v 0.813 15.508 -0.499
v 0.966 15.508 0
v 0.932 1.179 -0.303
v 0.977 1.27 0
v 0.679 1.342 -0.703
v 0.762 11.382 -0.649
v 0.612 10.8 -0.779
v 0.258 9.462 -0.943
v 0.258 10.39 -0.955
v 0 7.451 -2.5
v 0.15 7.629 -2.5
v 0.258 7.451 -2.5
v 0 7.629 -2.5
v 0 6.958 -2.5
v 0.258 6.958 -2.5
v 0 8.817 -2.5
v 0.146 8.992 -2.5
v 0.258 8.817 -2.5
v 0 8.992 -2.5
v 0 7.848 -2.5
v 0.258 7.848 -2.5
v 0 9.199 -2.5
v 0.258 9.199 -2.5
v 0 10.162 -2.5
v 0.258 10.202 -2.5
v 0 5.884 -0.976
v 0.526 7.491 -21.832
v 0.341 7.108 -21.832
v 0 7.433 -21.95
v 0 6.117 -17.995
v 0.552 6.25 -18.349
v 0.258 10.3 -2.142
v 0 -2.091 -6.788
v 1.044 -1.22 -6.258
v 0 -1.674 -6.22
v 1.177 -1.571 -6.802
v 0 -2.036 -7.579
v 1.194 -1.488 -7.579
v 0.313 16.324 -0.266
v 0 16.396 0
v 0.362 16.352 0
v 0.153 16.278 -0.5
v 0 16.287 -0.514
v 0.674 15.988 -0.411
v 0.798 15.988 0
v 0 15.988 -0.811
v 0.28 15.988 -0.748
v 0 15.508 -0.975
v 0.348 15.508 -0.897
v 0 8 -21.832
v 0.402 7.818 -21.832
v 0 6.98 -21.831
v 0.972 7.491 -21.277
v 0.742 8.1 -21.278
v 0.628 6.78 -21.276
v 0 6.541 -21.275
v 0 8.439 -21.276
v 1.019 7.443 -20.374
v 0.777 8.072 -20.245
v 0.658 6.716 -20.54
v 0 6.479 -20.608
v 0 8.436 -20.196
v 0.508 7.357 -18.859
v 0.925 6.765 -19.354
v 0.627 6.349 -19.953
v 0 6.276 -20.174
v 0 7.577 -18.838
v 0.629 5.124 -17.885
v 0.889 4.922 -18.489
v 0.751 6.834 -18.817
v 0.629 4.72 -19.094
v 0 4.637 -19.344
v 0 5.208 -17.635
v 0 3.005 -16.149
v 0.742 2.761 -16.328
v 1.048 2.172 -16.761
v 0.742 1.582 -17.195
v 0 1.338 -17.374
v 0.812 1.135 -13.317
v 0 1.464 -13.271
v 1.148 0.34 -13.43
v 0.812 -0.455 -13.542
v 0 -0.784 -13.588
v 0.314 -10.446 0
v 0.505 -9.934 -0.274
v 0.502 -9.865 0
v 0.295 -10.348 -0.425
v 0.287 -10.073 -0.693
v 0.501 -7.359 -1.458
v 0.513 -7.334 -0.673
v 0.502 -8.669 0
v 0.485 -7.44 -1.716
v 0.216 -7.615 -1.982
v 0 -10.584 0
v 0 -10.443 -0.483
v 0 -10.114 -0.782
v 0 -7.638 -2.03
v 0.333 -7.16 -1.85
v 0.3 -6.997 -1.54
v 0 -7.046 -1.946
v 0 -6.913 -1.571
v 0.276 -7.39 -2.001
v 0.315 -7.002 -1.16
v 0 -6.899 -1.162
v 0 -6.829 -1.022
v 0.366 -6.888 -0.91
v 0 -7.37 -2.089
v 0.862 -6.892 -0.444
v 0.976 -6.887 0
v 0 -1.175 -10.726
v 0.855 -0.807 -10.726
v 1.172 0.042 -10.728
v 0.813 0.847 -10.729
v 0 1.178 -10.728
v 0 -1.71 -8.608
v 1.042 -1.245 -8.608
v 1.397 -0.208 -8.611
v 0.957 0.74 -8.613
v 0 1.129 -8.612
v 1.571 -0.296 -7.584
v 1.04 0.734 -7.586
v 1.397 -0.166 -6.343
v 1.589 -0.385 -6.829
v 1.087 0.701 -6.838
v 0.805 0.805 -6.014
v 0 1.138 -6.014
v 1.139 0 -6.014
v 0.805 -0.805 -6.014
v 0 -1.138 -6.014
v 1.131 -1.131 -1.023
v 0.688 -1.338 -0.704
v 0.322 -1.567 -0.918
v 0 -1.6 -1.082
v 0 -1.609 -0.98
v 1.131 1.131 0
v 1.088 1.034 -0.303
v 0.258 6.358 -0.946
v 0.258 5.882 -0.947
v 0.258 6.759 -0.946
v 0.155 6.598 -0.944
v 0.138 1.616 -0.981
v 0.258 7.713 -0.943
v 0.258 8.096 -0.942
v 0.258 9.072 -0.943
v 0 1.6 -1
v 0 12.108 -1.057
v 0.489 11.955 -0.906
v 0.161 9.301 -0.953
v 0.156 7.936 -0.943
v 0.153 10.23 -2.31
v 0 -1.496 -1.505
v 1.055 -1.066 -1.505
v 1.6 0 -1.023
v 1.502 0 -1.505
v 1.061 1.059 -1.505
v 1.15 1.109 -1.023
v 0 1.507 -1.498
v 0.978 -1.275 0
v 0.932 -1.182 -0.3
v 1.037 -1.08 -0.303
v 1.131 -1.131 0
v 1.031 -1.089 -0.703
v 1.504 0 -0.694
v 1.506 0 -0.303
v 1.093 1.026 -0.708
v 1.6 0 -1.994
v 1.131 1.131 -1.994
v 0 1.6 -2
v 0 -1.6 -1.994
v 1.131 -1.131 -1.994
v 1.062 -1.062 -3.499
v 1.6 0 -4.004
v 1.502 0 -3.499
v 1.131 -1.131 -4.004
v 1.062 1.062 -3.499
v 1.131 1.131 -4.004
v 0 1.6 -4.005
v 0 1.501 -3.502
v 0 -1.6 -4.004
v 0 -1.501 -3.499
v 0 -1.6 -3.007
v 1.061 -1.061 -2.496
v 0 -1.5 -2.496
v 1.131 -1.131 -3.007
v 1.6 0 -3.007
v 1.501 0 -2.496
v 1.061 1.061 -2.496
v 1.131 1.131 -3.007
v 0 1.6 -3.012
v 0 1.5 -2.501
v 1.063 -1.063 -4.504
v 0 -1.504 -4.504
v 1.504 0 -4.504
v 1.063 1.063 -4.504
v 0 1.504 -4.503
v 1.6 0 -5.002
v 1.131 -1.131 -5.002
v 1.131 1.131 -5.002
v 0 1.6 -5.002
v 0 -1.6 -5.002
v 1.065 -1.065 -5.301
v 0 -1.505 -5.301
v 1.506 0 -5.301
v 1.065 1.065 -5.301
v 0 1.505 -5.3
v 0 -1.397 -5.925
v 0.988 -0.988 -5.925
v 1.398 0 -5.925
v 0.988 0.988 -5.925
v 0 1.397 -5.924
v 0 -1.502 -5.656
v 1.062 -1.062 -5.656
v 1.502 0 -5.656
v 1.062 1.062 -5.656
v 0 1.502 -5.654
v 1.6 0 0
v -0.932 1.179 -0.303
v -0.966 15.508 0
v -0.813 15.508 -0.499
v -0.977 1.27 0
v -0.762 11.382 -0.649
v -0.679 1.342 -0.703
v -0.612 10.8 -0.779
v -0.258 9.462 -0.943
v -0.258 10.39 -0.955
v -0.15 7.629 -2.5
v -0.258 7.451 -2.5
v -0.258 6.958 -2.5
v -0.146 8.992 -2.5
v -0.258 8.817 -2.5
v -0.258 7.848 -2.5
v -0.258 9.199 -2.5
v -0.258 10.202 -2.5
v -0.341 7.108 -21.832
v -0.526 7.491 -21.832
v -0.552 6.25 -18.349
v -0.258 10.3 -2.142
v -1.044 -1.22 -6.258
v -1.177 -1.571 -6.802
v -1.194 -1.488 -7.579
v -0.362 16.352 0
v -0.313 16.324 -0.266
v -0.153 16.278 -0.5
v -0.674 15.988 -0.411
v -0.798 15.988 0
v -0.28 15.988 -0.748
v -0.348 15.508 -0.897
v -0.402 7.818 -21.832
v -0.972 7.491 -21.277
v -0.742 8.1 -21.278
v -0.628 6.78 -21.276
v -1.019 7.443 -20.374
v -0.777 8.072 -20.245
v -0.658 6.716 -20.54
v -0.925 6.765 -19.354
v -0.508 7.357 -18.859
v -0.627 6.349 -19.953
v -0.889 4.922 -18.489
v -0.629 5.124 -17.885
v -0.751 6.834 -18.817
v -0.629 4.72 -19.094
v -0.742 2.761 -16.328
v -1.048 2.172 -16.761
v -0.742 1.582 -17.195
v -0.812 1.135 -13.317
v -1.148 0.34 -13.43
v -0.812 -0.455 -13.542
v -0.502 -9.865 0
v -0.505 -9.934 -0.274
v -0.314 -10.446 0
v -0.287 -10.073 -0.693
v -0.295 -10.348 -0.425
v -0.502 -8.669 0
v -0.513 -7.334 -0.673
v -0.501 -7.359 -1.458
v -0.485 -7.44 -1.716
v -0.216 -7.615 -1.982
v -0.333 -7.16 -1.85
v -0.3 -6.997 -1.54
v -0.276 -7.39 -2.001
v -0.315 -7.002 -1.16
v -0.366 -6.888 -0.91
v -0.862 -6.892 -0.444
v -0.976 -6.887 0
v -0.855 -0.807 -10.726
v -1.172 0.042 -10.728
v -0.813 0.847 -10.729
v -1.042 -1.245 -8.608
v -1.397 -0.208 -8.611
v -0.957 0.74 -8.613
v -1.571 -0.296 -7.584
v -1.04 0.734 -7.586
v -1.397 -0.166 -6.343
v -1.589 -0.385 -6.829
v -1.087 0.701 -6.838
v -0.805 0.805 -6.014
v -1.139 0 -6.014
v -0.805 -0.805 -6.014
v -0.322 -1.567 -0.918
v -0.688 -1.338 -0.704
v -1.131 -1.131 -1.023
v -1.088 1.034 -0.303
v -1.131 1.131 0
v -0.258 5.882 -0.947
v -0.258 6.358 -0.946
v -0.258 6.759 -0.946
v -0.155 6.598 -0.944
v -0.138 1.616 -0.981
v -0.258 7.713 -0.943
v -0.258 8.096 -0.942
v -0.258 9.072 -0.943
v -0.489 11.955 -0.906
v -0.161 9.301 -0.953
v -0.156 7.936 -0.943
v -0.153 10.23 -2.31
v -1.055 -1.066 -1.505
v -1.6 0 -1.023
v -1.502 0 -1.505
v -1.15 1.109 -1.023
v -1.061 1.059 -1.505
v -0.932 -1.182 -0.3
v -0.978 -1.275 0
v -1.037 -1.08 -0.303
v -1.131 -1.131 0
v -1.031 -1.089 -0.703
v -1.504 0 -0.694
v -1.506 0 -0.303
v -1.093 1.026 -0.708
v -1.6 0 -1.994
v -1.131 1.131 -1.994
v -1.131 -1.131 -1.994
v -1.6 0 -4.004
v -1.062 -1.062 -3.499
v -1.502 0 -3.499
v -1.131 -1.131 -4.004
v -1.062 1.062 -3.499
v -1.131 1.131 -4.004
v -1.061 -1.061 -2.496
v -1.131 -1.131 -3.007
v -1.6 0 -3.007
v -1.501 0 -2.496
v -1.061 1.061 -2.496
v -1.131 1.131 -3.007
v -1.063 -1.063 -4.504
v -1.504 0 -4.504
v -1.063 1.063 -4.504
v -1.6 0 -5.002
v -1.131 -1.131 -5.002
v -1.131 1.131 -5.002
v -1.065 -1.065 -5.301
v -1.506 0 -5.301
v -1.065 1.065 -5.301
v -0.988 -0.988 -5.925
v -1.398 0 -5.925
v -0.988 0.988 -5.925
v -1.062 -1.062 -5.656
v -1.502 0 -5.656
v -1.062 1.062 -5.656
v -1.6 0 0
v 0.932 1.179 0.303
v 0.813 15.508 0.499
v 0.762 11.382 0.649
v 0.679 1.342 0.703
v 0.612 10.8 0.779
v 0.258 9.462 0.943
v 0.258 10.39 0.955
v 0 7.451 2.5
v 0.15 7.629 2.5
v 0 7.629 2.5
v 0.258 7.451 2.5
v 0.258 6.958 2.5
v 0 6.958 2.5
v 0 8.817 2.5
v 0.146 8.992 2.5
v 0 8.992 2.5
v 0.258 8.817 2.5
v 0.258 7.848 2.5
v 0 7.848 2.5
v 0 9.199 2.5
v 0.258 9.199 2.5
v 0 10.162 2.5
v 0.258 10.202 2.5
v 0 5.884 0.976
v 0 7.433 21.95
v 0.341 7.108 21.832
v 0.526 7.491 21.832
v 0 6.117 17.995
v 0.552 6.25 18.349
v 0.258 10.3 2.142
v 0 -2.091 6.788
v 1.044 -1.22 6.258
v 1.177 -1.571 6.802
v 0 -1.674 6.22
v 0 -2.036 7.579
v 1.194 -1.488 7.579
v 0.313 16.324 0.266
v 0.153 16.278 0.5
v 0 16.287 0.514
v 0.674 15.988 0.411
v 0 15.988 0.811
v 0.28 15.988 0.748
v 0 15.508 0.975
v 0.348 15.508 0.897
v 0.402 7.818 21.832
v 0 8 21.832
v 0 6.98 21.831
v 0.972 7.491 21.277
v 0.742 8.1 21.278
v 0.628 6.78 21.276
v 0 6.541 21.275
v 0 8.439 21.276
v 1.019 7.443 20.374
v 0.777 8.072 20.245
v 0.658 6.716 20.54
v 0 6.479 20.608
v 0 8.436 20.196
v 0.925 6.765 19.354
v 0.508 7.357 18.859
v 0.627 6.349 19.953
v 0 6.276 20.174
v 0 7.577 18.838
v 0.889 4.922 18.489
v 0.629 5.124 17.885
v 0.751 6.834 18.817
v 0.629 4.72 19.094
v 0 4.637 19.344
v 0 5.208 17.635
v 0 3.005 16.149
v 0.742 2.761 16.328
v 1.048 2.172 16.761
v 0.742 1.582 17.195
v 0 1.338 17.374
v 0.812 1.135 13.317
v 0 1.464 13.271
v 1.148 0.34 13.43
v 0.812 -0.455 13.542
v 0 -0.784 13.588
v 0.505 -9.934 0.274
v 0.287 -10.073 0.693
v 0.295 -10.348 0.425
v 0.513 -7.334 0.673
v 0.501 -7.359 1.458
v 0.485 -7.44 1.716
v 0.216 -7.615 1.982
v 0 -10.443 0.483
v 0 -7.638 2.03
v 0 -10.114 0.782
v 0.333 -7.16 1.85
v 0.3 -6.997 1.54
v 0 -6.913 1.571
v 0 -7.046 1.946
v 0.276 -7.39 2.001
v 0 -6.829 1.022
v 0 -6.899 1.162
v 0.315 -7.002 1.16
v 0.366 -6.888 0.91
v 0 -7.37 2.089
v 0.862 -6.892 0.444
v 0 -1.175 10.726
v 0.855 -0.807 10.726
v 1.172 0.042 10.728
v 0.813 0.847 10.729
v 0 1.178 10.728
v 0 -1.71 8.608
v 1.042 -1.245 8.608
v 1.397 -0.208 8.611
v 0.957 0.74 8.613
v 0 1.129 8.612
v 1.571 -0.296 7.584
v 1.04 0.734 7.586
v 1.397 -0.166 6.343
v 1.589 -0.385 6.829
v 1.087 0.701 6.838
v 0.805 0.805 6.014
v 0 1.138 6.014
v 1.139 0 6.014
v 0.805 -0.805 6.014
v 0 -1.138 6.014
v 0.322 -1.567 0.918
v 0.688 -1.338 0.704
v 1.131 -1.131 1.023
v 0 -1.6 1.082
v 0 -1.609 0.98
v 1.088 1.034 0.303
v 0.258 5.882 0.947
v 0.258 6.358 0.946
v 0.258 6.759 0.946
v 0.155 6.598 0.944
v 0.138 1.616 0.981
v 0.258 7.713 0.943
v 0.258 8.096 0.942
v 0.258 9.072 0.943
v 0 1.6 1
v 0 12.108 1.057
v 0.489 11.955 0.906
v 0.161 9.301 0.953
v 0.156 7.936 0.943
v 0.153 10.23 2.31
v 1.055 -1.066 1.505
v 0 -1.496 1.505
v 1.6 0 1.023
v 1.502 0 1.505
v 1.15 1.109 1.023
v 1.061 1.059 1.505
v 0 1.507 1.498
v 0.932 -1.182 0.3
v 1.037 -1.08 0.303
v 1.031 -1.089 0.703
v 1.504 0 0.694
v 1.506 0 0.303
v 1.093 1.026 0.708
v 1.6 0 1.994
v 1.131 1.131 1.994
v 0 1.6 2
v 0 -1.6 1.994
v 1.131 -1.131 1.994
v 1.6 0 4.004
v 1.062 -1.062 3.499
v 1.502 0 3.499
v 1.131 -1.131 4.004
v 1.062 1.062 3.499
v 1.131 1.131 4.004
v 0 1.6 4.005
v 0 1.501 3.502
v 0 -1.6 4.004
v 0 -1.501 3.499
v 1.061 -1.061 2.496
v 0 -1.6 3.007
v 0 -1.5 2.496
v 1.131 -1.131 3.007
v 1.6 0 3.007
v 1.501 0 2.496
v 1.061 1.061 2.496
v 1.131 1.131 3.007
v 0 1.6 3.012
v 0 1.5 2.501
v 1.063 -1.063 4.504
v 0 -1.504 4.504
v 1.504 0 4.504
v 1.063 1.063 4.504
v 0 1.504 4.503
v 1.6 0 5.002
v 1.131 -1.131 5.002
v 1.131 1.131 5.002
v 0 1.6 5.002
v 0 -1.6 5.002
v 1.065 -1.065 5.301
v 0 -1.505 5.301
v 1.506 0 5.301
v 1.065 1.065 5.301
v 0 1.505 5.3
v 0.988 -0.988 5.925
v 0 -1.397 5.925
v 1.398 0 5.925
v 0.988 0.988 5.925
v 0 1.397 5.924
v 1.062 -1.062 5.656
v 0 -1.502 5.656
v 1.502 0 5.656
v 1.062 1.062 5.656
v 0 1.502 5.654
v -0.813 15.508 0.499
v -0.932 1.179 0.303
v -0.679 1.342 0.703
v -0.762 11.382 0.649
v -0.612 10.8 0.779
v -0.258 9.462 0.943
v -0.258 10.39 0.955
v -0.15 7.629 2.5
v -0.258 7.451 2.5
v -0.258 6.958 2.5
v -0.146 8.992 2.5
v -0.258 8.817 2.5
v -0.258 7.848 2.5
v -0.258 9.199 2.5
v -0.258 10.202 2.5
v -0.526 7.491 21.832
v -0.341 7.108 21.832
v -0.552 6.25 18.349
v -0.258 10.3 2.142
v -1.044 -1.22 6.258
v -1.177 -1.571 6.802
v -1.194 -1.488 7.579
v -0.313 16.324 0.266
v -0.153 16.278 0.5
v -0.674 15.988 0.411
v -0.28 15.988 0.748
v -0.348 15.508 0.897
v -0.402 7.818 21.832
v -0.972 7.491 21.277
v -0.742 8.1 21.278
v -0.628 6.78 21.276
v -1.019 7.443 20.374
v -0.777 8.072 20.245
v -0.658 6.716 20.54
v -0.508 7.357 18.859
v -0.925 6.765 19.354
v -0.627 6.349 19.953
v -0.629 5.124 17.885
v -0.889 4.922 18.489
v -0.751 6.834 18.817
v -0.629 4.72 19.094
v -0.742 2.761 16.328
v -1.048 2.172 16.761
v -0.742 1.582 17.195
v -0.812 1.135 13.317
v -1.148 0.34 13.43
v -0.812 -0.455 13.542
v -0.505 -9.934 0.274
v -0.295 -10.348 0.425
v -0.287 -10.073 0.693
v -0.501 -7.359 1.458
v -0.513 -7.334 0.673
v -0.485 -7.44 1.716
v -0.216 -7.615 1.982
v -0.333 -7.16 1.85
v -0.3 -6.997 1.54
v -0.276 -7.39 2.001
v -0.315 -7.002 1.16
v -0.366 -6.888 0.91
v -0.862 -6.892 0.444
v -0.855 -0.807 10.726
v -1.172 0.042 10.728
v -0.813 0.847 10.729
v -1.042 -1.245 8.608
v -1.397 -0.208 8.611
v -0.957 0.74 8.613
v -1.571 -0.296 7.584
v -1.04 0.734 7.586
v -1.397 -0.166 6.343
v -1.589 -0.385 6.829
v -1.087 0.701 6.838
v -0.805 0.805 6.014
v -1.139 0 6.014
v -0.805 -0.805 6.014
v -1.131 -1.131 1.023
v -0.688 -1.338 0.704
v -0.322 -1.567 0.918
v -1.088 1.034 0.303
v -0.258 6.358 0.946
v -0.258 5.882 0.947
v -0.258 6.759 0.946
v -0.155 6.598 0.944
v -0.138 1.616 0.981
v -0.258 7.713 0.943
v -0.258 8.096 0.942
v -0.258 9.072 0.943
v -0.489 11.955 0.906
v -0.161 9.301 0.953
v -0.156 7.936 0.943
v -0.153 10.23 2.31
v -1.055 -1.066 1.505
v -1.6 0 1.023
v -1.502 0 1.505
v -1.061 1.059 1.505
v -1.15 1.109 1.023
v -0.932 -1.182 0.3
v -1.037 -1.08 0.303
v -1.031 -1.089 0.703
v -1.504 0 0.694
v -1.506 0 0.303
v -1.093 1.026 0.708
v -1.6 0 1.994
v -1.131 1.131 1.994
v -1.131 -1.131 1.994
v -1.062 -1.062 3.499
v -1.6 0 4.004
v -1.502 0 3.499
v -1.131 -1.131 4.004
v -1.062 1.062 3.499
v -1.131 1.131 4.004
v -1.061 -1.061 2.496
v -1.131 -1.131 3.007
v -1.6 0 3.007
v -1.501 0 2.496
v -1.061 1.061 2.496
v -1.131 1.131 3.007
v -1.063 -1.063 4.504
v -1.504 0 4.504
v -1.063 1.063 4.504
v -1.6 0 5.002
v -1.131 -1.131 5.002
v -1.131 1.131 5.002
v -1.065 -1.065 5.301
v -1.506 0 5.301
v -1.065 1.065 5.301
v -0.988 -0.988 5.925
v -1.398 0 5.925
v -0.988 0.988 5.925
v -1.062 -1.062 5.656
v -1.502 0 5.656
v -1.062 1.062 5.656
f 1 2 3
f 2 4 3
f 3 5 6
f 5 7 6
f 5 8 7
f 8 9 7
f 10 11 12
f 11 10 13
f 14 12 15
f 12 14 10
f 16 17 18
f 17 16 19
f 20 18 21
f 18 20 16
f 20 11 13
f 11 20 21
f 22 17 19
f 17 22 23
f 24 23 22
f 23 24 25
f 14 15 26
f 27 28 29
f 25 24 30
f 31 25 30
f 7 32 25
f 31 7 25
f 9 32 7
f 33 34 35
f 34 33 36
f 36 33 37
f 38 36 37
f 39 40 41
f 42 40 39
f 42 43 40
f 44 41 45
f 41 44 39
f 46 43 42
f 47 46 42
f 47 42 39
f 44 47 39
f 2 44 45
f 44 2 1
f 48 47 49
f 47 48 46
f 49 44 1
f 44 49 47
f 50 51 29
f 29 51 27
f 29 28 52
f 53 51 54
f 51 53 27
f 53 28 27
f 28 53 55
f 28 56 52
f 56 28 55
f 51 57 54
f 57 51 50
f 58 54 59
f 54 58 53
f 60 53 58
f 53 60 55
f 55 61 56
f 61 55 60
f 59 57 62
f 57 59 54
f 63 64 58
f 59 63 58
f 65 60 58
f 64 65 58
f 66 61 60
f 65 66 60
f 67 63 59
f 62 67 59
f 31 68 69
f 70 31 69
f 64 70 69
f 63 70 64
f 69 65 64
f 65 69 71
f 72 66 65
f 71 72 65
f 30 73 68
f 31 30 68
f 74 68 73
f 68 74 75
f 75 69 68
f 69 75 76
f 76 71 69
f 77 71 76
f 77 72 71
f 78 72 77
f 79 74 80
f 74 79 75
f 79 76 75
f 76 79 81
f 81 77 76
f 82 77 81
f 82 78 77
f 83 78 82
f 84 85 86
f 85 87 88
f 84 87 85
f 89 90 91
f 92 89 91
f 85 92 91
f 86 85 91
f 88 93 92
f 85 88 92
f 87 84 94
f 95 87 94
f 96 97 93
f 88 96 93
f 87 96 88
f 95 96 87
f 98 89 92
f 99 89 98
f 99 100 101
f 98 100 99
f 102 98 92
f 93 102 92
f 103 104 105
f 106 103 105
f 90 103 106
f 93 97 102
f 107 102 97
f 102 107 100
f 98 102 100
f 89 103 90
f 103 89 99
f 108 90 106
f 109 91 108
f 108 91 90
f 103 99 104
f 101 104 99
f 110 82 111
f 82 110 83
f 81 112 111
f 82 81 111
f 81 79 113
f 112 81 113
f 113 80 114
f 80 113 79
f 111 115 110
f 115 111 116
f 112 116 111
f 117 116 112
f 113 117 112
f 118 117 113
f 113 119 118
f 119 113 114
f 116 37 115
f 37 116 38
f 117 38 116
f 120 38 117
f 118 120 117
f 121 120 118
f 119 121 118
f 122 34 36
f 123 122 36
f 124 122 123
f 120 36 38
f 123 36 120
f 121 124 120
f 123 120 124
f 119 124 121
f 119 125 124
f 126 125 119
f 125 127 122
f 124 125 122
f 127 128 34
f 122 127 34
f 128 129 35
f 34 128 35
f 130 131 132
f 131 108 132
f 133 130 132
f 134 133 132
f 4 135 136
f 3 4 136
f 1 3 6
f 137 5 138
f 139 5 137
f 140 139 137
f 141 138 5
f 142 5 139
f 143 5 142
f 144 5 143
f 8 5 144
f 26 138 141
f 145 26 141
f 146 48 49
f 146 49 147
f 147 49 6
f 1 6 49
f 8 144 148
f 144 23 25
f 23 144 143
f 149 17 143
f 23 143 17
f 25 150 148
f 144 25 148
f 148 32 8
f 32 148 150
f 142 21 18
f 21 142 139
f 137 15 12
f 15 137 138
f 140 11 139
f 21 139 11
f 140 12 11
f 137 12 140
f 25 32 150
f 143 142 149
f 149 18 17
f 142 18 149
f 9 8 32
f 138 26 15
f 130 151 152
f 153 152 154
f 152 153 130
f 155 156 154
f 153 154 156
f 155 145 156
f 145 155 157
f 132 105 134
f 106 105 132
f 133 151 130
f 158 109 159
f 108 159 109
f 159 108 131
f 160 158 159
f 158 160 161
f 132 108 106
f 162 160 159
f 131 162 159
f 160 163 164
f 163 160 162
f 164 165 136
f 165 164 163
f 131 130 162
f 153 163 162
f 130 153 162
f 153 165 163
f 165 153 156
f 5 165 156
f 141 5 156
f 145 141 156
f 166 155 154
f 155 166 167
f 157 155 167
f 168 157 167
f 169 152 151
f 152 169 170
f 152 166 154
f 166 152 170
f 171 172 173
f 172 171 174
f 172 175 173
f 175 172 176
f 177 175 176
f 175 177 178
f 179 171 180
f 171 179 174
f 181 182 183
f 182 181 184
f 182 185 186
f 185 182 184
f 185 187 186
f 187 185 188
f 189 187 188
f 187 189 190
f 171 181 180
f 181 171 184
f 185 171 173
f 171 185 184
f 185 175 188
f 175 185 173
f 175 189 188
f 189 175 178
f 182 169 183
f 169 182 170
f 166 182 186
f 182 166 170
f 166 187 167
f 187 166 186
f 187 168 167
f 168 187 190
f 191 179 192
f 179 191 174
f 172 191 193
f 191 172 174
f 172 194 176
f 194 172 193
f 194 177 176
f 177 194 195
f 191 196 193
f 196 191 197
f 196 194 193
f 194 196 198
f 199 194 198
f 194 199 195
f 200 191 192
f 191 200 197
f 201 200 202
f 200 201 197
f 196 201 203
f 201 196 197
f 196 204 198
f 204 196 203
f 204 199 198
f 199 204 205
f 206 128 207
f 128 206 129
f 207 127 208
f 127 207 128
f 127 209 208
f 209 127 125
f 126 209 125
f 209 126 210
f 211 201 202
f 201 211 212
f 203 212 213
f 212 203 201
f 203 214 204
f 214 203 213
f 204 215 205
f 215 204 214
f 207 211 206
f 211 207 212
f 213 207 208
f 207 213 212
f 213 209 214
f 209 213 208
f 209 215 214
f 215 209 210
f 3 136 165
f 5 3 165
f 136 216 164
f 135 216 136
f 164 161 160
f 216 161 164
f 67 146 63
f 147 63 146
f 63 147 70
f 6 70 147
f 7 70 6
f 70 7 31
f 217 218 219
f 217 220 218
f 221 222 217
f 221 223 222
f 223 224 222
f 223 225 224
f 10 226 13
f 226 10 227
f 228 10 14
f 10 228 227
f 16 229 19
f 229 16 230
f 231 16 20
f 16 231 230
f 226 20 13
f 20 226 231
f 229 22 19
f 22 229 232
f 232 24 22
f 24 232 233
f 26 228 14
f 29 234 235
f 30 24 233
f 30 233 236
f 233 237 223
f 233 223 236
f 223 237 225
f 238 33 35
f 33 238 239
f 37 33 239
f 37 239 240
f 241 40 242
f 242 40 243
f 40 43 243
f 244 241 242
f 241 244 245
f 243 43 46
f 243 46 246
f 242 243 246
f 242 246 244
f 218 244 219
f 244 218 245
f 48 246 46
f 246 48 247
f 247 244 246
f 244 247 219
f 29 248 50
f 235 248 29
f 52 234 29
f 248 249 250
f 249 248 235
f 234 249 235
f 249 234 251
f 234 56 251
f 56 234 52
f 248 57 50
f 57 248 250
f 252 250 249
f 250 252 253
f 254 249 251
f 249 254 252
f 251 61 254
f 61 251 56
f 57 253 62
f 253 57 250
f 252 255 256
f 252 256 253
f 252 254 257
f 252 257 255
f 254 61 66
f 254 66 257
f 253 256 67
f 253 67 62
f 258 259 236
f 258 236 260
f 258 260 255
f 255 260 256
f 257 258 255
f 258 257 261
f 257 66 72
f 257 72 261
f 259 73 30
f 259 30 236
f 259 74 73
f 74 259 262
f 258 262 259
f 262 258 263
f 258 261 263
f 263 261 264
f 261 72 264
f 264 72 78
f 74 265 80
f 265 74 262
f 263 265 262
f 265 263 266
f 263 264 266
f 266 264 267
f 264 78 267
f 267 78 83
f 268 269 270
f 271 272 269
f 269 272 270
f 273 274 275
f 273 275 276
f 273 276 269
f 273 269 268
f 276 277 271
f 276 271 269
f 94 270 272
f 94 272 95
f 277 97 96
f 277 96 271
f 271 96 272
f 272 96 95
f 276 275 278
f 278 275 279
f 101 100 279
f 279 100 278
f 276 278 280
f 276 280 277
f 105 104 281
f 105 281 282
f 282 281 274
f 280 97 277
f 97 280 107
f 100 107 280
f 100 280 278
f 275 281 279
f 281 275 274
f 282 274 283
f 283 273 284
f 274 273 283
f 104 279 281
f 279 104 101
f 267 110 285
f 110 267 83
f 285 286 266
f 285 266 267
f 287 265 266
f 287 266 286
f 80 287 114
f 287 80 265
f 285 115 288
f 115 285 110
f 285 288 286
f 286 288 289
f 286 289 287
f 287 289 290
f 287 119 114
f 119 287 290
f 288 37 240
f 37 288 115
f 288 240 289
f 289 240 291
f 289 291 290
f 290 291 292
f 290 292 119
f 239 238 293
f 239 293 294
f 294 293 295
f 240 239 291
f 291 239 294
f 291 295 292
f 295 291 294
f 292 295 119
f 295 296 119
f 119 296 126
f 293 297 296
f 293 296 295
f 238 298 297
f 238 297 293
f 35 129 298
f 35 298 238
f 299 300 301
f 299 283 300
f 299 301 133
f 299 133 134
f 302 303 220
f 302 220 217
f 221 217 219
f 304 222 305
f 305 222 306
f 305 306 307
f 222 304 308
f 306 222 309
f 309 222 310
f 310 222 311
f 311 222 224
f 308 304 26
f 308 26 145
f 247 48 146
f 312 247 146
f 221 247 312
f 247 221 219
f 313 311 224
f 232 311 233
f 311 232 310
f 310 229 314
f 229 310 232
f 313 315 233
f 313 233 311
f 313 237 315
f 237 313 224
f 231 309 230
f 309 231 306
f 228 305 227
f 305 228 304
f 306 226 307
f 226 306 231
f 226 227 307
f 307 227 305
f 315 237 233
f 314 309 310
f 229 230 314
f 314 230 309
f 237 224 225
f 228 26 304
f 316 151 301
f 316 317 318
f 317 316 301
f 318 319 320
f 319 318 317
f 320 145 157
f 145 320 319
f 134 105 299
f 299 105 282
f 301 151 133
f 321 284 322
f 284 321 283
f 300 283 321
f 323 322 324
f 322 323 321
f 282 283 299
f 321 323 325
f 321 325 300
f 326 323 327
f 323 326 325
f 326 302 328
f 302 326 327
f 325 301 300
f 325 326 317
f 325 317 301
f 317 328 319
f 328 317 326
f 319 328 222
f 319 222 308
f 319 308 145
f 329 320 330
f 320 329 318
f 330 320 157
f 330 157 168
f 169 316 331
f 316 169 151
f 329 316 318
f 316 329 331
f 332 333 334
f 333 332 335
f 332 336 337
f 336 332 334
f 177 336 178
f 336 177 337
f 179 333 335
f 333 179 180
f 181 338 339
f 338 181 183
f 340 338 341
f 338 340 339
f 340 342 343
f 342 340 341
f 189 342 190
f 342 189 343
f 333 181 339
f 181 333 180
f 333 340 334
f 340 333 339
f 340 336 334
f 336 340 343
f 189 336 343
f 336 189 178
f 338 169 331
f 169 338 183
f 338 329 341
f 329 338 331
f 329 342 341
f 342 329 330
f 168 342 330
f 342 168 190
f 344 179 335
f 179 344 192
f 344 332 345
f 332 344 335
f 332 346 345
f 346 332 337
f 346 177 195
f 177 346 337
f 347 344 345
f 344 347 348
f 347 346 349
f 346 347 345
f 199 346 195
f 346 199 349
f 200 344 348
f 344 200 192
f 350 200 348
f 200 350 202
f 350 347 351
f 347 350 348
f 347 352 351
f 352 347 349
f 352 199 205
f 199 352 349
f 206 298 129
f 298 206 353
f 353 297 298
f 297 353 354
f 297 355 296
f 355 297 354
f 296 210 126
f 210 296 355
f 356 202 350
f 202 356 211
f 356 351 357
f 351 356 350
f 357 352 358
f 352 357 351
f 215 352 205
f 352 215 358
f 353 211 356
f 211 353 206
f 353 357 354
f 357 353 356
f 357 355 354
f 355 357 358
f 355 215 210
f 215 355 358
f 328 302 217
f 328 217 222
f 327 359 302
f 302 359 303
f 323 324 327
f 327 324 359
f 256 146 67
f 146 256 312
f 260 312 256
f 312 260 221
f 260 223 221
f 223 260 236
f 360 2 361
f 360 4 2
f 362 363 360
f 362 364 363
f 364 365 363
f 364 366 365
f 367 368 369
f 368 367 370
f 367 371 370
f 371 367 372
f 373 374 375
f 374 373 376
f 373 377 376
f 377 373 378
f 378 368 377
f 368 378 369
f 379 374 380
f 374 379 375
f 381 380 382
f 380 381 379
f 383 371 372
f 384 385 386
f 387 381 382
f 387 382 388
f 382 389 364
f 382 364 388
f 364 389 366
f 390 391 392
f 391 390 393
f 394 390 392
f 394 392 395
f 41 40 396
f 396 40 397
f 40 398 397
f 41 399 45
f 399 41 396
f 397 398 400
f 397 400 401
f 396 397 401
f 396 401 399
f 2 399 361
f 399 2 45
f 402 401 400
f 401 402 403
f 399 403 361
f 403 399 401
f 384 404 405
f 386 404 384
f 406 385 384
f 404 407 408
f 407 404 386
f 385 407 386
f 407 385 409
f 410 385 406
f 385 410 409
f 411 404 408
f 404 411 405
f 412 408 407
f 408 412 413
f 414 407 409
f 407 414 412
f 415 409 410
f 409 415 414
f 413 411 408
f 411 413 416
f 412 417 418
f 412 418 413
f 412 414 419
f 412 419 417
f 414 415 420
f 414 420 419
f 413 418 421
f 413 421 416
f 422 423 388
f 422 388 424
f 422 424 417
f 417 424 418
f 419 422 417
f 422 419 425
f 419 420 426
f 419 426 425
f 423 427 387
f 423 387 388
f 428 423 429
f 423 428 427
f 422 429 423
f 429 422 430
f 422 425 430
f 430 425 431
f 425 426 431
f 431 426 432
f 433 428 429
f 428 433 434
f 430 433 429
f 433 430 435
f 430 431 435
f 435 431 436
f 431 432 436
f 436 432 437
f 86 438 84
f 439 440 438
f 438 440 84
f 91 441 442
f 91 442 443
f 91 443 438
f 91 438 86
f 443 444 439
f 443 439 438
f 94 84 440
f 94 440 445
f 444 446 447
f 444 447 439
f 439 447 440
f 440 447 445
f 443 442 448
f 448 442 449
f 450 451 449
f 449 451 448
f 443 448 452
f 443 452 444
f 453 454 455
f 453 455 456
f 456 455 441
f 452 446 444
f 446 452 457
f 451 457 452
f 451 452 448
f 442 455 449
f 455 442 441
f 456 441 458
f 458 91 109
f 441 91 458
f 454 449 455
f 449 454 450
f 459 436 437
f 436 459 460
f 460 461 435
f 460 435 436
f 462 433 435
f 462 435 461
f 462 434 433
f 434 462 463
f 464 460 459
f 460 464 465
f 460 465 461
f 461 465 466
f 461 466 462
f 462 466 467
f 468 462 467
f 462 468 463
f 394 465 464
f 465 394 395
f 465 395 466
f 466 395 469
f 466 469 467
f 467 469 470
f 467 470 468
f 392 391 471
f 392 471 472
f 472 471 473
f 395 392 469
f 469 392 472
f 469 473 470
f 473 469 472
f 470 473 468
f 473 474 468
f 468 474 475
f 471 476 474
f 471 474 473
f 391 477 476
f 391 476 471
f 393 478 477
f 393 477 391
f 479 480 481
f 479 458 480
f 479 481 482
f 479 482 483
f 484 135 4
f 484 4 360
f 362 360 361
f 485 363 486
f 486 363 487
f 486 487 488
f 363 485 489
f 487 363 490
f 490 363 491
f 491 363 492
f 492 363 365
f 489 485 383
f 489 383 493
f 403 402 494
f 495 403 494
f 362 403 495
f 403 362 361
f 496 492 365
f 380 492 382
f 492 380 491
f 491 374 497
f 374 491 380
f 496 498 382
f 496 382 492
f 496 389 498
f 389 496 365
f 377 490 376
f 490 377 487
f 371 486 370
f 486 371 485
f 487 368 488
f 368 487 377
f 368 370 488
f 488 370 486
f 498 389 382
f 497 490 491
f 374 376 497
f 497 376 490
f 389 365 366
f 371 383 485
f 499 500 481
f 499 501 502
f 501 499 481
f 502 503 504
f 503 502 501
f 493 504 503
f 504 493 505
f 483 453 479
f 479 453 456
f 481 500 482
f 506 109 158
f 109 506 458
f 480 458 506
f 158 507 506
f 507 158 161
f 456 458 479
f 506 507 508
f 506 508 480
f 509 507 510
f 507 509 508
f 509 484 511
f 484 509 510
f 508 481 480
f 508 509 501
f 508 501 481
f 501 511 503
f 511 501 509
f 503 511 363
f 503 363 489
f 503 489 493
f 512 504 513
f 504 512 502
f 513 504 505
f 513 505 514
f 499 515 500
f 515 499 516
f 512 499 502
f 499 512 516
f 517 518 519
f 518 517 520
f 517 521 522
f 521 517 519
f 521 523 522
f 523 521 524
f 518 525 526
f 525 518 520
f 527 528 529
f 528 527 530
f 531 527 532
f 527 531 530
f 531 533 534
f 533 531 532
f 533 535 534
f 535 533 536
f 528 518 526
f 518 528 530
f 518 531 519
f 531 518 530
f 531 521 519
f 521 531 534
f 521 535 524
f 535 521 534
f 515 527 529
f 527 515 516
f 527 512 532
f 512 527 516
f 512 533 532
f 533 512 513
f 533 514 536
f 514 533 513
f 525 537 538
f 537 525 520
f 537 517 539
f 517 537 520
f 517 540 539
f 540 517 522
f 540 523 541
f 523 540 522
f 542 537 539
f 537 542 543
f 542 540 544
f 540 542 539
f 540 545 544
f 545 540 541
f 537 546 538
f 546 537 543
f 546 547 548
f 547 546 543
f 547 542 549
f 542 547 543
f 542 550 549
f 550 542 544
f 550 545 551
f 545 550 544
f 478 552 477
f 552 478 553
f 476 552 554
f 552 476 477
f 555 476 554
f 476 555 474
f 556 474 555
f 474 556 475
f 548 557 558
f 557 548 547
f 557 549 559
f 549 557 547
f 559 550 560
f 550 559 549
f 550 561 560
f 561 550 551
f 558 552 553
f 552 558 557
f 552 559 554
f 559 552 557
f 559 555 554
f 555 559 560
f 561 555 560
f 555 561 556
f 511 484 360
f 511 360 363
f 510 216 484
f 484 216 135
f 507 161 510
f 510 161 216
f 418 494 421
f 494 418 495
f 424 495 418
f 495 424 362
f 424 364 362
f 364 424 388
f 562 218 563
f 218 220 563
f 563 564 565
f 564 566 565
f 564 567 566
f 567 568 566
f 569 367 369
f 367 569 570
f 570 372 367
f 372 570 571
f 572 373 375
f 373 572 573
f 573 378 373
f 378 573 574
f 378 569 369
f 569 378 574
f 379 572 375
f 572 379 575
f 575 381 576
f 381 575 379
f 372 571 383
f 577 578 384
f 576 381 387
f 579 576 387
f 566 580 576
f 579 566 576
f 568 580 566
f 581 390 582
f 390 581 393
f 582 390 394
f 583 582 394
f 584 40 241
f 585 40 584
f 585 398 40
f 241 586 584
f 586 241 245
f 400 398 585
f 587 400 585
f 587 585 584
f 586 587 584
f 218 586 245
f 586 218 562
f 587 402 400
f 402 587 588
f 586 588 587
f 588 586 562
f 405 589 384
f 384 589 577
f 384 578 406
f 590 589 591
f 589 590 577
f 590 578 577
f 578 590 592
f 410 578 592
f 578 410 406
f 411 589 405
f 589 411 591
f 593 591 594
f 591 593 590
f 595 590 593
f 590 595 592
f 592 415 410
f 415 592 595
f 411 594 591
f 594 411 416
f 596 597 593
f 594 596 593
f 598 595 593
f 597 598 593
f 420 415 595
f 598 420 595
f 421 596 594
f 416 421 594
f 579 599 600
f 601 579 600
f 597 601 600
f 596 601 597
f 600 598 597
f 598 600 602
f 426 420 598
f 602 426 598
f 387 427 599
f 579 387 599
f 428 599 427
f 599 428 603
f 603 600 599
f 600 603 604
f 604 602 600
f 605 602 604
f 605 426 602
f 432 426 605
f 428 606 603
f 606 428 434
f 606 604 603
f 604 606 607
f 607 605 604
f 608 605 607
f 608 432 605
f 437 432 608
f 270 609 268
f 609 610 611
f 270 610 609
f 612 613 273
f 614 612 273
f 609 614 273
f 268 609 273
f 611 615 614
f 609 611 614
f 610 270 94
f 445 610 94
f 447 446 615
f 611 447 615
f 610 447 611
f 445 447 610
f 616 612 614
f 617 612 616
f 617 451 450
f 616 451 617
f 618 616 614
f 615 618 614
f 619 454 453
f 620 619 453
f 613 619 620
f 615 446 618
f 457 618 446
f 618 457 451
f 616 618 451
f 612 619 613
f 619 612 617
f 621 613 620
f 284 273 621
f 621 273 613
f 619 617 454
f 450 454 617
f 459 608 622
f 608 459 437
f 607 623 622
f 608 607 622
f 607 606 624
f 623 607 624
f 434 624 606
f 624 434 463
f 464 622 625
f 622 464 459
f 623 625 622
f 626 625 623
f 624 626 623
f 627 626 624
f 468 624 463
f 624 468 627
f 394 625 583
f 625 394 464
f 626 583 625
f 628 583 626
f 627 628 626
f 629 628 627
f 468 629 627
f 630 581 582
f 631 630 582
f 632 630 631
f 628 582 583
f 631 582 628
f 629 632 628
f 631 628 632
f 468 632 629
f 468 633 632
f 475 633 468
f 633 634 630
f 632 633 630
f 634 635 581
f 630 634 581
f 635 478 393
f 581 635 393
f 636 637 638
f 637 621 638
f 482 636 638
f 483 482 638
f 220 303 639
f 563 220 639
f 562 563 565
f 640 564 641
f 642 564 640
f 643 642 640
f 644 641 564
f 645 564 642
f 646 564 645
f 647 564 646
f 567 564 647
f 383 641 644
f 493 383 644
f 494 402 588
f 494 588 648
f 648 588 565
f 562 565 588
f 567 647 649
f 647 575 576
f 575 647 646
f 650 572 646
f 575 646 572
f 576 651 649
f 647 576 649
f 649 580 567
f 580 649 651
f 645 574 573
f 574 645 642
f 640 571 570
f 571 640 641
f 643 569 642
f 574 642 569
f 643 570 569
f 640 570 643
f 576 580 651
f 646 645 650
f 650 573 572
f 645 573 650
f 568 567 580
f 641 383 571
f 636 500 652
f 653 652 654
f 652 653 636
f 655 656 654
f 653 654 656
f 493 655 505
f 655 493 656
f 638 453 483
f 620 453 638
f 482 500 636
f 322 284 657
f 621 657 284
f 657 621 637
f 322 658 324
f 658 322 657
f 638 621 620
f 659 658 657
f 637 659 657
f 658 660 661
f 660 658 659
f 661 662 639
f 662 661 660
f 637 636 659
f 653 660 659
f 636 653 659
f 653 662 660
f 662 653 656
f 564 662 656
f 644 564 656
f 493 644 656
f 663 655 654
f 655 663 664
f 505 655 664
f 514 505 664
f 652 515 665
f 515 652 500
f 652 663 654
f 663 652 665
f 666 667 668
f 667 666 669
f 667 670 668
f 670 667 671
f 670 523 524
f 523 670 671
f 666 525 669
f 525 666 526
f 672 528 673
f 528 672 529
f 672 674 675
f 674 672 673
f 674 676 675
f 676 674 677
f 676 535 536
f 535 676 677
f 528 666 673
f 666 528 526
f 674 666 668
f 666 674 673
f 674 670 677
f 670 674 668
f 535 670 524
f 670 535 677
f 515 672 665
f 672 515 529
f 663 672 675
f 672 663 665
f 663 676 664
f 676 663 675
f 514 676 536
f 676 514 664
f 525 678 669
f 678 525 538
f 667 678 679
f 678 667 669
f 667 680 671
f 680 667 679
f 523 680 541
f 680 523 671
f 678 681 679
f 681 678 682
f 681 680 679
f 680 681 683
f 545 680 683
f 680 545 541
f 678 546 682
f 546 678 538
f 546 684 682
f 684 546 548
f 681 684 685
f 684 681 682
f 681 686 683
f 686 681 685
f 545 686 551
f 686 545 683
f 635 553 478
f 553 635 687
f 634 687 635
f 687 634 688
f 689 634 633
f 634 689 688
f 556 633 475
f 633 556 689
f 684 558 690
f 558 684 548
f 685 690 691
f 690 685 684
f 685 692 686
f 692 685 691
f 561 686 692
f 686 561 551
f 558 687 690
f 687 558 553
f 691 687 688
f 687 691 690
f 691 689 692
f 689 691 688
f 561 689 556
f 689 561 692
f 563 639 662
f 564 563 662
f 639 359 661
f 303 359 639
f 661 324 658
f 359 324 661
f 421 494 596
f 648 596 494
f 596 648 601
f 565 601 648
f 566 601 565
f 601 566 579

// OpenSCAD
use <../lib.scad>
use <s/93231s01.scad>
function ldraw_lib__93231() = [
// 0 Minifig Long Bow with Arrow
// 0 Name: 93231.dat
// 0 Author: Philippe Hurbain [Philo]
// 0 !LDRAW_ORG Part UPDATE 2012-03
// 0 !LICENSE Licensed under CC BY 4.0 : see CAreadme.txt
// 
// 0 BFC CERTIFY CCW
  [0,"BFC","CERTIFY"],
  [0,"BFC","CCW"],
// 
// 0 !CATEGORY Minifig Accessory
// 
// 0 !HISTORY 2012-11-22 {LEGO Digital Designer} Original part shape
// 0 !HISTORY 2012-11-22 [Philo] File preparation for LDraw Parts Tracker
// 0 !HISTORY 2012-12-28 [PTadmin] Official Update 2012-03
// 
// 
// 1 16 0 0 0 1 0 0 0 1 0 0 0 1 s\93231s01.dat
  [1,16,0,0,0,1,0,0,0,1,0,0,0,1, ldraw_lib__s__93231s01()],
// 1 16 0 0 0 -1 0 0 0 1 0 0 0 1 s\93231s01.dat
  [1,16,0,0,0,-1,0,0,0,1,0,0,0,1, ldraw_lib__s__93231s01()],
// 1 16 0 0 0 1 0 0 0 -1 0 0 0 1 s\93231s01.dat
  [1,16,0,0,0,1,0,0,0,-1,0,0,0,1, ldraw_lib__s__93231s01()],
// 1 16 0 0 0 -1 0 0 0 -1 0 0 0 1 s\93231s01.dat
  [1,16,0,0,0,-1,0,0,0,-1,0,0,0,1, ldraw_lib__s__93231s01()],
];
module ldraw_lib__93231(step=0, col=false, unit=2/5, alt=false, line=0.2, solid=!$preview)
    makepoly(ldraw_lib__93231(), step=step, col=col, unit=unit, alt=alt, line=line, solid=solid);
ldraw_lib__93231(line=0.2);
